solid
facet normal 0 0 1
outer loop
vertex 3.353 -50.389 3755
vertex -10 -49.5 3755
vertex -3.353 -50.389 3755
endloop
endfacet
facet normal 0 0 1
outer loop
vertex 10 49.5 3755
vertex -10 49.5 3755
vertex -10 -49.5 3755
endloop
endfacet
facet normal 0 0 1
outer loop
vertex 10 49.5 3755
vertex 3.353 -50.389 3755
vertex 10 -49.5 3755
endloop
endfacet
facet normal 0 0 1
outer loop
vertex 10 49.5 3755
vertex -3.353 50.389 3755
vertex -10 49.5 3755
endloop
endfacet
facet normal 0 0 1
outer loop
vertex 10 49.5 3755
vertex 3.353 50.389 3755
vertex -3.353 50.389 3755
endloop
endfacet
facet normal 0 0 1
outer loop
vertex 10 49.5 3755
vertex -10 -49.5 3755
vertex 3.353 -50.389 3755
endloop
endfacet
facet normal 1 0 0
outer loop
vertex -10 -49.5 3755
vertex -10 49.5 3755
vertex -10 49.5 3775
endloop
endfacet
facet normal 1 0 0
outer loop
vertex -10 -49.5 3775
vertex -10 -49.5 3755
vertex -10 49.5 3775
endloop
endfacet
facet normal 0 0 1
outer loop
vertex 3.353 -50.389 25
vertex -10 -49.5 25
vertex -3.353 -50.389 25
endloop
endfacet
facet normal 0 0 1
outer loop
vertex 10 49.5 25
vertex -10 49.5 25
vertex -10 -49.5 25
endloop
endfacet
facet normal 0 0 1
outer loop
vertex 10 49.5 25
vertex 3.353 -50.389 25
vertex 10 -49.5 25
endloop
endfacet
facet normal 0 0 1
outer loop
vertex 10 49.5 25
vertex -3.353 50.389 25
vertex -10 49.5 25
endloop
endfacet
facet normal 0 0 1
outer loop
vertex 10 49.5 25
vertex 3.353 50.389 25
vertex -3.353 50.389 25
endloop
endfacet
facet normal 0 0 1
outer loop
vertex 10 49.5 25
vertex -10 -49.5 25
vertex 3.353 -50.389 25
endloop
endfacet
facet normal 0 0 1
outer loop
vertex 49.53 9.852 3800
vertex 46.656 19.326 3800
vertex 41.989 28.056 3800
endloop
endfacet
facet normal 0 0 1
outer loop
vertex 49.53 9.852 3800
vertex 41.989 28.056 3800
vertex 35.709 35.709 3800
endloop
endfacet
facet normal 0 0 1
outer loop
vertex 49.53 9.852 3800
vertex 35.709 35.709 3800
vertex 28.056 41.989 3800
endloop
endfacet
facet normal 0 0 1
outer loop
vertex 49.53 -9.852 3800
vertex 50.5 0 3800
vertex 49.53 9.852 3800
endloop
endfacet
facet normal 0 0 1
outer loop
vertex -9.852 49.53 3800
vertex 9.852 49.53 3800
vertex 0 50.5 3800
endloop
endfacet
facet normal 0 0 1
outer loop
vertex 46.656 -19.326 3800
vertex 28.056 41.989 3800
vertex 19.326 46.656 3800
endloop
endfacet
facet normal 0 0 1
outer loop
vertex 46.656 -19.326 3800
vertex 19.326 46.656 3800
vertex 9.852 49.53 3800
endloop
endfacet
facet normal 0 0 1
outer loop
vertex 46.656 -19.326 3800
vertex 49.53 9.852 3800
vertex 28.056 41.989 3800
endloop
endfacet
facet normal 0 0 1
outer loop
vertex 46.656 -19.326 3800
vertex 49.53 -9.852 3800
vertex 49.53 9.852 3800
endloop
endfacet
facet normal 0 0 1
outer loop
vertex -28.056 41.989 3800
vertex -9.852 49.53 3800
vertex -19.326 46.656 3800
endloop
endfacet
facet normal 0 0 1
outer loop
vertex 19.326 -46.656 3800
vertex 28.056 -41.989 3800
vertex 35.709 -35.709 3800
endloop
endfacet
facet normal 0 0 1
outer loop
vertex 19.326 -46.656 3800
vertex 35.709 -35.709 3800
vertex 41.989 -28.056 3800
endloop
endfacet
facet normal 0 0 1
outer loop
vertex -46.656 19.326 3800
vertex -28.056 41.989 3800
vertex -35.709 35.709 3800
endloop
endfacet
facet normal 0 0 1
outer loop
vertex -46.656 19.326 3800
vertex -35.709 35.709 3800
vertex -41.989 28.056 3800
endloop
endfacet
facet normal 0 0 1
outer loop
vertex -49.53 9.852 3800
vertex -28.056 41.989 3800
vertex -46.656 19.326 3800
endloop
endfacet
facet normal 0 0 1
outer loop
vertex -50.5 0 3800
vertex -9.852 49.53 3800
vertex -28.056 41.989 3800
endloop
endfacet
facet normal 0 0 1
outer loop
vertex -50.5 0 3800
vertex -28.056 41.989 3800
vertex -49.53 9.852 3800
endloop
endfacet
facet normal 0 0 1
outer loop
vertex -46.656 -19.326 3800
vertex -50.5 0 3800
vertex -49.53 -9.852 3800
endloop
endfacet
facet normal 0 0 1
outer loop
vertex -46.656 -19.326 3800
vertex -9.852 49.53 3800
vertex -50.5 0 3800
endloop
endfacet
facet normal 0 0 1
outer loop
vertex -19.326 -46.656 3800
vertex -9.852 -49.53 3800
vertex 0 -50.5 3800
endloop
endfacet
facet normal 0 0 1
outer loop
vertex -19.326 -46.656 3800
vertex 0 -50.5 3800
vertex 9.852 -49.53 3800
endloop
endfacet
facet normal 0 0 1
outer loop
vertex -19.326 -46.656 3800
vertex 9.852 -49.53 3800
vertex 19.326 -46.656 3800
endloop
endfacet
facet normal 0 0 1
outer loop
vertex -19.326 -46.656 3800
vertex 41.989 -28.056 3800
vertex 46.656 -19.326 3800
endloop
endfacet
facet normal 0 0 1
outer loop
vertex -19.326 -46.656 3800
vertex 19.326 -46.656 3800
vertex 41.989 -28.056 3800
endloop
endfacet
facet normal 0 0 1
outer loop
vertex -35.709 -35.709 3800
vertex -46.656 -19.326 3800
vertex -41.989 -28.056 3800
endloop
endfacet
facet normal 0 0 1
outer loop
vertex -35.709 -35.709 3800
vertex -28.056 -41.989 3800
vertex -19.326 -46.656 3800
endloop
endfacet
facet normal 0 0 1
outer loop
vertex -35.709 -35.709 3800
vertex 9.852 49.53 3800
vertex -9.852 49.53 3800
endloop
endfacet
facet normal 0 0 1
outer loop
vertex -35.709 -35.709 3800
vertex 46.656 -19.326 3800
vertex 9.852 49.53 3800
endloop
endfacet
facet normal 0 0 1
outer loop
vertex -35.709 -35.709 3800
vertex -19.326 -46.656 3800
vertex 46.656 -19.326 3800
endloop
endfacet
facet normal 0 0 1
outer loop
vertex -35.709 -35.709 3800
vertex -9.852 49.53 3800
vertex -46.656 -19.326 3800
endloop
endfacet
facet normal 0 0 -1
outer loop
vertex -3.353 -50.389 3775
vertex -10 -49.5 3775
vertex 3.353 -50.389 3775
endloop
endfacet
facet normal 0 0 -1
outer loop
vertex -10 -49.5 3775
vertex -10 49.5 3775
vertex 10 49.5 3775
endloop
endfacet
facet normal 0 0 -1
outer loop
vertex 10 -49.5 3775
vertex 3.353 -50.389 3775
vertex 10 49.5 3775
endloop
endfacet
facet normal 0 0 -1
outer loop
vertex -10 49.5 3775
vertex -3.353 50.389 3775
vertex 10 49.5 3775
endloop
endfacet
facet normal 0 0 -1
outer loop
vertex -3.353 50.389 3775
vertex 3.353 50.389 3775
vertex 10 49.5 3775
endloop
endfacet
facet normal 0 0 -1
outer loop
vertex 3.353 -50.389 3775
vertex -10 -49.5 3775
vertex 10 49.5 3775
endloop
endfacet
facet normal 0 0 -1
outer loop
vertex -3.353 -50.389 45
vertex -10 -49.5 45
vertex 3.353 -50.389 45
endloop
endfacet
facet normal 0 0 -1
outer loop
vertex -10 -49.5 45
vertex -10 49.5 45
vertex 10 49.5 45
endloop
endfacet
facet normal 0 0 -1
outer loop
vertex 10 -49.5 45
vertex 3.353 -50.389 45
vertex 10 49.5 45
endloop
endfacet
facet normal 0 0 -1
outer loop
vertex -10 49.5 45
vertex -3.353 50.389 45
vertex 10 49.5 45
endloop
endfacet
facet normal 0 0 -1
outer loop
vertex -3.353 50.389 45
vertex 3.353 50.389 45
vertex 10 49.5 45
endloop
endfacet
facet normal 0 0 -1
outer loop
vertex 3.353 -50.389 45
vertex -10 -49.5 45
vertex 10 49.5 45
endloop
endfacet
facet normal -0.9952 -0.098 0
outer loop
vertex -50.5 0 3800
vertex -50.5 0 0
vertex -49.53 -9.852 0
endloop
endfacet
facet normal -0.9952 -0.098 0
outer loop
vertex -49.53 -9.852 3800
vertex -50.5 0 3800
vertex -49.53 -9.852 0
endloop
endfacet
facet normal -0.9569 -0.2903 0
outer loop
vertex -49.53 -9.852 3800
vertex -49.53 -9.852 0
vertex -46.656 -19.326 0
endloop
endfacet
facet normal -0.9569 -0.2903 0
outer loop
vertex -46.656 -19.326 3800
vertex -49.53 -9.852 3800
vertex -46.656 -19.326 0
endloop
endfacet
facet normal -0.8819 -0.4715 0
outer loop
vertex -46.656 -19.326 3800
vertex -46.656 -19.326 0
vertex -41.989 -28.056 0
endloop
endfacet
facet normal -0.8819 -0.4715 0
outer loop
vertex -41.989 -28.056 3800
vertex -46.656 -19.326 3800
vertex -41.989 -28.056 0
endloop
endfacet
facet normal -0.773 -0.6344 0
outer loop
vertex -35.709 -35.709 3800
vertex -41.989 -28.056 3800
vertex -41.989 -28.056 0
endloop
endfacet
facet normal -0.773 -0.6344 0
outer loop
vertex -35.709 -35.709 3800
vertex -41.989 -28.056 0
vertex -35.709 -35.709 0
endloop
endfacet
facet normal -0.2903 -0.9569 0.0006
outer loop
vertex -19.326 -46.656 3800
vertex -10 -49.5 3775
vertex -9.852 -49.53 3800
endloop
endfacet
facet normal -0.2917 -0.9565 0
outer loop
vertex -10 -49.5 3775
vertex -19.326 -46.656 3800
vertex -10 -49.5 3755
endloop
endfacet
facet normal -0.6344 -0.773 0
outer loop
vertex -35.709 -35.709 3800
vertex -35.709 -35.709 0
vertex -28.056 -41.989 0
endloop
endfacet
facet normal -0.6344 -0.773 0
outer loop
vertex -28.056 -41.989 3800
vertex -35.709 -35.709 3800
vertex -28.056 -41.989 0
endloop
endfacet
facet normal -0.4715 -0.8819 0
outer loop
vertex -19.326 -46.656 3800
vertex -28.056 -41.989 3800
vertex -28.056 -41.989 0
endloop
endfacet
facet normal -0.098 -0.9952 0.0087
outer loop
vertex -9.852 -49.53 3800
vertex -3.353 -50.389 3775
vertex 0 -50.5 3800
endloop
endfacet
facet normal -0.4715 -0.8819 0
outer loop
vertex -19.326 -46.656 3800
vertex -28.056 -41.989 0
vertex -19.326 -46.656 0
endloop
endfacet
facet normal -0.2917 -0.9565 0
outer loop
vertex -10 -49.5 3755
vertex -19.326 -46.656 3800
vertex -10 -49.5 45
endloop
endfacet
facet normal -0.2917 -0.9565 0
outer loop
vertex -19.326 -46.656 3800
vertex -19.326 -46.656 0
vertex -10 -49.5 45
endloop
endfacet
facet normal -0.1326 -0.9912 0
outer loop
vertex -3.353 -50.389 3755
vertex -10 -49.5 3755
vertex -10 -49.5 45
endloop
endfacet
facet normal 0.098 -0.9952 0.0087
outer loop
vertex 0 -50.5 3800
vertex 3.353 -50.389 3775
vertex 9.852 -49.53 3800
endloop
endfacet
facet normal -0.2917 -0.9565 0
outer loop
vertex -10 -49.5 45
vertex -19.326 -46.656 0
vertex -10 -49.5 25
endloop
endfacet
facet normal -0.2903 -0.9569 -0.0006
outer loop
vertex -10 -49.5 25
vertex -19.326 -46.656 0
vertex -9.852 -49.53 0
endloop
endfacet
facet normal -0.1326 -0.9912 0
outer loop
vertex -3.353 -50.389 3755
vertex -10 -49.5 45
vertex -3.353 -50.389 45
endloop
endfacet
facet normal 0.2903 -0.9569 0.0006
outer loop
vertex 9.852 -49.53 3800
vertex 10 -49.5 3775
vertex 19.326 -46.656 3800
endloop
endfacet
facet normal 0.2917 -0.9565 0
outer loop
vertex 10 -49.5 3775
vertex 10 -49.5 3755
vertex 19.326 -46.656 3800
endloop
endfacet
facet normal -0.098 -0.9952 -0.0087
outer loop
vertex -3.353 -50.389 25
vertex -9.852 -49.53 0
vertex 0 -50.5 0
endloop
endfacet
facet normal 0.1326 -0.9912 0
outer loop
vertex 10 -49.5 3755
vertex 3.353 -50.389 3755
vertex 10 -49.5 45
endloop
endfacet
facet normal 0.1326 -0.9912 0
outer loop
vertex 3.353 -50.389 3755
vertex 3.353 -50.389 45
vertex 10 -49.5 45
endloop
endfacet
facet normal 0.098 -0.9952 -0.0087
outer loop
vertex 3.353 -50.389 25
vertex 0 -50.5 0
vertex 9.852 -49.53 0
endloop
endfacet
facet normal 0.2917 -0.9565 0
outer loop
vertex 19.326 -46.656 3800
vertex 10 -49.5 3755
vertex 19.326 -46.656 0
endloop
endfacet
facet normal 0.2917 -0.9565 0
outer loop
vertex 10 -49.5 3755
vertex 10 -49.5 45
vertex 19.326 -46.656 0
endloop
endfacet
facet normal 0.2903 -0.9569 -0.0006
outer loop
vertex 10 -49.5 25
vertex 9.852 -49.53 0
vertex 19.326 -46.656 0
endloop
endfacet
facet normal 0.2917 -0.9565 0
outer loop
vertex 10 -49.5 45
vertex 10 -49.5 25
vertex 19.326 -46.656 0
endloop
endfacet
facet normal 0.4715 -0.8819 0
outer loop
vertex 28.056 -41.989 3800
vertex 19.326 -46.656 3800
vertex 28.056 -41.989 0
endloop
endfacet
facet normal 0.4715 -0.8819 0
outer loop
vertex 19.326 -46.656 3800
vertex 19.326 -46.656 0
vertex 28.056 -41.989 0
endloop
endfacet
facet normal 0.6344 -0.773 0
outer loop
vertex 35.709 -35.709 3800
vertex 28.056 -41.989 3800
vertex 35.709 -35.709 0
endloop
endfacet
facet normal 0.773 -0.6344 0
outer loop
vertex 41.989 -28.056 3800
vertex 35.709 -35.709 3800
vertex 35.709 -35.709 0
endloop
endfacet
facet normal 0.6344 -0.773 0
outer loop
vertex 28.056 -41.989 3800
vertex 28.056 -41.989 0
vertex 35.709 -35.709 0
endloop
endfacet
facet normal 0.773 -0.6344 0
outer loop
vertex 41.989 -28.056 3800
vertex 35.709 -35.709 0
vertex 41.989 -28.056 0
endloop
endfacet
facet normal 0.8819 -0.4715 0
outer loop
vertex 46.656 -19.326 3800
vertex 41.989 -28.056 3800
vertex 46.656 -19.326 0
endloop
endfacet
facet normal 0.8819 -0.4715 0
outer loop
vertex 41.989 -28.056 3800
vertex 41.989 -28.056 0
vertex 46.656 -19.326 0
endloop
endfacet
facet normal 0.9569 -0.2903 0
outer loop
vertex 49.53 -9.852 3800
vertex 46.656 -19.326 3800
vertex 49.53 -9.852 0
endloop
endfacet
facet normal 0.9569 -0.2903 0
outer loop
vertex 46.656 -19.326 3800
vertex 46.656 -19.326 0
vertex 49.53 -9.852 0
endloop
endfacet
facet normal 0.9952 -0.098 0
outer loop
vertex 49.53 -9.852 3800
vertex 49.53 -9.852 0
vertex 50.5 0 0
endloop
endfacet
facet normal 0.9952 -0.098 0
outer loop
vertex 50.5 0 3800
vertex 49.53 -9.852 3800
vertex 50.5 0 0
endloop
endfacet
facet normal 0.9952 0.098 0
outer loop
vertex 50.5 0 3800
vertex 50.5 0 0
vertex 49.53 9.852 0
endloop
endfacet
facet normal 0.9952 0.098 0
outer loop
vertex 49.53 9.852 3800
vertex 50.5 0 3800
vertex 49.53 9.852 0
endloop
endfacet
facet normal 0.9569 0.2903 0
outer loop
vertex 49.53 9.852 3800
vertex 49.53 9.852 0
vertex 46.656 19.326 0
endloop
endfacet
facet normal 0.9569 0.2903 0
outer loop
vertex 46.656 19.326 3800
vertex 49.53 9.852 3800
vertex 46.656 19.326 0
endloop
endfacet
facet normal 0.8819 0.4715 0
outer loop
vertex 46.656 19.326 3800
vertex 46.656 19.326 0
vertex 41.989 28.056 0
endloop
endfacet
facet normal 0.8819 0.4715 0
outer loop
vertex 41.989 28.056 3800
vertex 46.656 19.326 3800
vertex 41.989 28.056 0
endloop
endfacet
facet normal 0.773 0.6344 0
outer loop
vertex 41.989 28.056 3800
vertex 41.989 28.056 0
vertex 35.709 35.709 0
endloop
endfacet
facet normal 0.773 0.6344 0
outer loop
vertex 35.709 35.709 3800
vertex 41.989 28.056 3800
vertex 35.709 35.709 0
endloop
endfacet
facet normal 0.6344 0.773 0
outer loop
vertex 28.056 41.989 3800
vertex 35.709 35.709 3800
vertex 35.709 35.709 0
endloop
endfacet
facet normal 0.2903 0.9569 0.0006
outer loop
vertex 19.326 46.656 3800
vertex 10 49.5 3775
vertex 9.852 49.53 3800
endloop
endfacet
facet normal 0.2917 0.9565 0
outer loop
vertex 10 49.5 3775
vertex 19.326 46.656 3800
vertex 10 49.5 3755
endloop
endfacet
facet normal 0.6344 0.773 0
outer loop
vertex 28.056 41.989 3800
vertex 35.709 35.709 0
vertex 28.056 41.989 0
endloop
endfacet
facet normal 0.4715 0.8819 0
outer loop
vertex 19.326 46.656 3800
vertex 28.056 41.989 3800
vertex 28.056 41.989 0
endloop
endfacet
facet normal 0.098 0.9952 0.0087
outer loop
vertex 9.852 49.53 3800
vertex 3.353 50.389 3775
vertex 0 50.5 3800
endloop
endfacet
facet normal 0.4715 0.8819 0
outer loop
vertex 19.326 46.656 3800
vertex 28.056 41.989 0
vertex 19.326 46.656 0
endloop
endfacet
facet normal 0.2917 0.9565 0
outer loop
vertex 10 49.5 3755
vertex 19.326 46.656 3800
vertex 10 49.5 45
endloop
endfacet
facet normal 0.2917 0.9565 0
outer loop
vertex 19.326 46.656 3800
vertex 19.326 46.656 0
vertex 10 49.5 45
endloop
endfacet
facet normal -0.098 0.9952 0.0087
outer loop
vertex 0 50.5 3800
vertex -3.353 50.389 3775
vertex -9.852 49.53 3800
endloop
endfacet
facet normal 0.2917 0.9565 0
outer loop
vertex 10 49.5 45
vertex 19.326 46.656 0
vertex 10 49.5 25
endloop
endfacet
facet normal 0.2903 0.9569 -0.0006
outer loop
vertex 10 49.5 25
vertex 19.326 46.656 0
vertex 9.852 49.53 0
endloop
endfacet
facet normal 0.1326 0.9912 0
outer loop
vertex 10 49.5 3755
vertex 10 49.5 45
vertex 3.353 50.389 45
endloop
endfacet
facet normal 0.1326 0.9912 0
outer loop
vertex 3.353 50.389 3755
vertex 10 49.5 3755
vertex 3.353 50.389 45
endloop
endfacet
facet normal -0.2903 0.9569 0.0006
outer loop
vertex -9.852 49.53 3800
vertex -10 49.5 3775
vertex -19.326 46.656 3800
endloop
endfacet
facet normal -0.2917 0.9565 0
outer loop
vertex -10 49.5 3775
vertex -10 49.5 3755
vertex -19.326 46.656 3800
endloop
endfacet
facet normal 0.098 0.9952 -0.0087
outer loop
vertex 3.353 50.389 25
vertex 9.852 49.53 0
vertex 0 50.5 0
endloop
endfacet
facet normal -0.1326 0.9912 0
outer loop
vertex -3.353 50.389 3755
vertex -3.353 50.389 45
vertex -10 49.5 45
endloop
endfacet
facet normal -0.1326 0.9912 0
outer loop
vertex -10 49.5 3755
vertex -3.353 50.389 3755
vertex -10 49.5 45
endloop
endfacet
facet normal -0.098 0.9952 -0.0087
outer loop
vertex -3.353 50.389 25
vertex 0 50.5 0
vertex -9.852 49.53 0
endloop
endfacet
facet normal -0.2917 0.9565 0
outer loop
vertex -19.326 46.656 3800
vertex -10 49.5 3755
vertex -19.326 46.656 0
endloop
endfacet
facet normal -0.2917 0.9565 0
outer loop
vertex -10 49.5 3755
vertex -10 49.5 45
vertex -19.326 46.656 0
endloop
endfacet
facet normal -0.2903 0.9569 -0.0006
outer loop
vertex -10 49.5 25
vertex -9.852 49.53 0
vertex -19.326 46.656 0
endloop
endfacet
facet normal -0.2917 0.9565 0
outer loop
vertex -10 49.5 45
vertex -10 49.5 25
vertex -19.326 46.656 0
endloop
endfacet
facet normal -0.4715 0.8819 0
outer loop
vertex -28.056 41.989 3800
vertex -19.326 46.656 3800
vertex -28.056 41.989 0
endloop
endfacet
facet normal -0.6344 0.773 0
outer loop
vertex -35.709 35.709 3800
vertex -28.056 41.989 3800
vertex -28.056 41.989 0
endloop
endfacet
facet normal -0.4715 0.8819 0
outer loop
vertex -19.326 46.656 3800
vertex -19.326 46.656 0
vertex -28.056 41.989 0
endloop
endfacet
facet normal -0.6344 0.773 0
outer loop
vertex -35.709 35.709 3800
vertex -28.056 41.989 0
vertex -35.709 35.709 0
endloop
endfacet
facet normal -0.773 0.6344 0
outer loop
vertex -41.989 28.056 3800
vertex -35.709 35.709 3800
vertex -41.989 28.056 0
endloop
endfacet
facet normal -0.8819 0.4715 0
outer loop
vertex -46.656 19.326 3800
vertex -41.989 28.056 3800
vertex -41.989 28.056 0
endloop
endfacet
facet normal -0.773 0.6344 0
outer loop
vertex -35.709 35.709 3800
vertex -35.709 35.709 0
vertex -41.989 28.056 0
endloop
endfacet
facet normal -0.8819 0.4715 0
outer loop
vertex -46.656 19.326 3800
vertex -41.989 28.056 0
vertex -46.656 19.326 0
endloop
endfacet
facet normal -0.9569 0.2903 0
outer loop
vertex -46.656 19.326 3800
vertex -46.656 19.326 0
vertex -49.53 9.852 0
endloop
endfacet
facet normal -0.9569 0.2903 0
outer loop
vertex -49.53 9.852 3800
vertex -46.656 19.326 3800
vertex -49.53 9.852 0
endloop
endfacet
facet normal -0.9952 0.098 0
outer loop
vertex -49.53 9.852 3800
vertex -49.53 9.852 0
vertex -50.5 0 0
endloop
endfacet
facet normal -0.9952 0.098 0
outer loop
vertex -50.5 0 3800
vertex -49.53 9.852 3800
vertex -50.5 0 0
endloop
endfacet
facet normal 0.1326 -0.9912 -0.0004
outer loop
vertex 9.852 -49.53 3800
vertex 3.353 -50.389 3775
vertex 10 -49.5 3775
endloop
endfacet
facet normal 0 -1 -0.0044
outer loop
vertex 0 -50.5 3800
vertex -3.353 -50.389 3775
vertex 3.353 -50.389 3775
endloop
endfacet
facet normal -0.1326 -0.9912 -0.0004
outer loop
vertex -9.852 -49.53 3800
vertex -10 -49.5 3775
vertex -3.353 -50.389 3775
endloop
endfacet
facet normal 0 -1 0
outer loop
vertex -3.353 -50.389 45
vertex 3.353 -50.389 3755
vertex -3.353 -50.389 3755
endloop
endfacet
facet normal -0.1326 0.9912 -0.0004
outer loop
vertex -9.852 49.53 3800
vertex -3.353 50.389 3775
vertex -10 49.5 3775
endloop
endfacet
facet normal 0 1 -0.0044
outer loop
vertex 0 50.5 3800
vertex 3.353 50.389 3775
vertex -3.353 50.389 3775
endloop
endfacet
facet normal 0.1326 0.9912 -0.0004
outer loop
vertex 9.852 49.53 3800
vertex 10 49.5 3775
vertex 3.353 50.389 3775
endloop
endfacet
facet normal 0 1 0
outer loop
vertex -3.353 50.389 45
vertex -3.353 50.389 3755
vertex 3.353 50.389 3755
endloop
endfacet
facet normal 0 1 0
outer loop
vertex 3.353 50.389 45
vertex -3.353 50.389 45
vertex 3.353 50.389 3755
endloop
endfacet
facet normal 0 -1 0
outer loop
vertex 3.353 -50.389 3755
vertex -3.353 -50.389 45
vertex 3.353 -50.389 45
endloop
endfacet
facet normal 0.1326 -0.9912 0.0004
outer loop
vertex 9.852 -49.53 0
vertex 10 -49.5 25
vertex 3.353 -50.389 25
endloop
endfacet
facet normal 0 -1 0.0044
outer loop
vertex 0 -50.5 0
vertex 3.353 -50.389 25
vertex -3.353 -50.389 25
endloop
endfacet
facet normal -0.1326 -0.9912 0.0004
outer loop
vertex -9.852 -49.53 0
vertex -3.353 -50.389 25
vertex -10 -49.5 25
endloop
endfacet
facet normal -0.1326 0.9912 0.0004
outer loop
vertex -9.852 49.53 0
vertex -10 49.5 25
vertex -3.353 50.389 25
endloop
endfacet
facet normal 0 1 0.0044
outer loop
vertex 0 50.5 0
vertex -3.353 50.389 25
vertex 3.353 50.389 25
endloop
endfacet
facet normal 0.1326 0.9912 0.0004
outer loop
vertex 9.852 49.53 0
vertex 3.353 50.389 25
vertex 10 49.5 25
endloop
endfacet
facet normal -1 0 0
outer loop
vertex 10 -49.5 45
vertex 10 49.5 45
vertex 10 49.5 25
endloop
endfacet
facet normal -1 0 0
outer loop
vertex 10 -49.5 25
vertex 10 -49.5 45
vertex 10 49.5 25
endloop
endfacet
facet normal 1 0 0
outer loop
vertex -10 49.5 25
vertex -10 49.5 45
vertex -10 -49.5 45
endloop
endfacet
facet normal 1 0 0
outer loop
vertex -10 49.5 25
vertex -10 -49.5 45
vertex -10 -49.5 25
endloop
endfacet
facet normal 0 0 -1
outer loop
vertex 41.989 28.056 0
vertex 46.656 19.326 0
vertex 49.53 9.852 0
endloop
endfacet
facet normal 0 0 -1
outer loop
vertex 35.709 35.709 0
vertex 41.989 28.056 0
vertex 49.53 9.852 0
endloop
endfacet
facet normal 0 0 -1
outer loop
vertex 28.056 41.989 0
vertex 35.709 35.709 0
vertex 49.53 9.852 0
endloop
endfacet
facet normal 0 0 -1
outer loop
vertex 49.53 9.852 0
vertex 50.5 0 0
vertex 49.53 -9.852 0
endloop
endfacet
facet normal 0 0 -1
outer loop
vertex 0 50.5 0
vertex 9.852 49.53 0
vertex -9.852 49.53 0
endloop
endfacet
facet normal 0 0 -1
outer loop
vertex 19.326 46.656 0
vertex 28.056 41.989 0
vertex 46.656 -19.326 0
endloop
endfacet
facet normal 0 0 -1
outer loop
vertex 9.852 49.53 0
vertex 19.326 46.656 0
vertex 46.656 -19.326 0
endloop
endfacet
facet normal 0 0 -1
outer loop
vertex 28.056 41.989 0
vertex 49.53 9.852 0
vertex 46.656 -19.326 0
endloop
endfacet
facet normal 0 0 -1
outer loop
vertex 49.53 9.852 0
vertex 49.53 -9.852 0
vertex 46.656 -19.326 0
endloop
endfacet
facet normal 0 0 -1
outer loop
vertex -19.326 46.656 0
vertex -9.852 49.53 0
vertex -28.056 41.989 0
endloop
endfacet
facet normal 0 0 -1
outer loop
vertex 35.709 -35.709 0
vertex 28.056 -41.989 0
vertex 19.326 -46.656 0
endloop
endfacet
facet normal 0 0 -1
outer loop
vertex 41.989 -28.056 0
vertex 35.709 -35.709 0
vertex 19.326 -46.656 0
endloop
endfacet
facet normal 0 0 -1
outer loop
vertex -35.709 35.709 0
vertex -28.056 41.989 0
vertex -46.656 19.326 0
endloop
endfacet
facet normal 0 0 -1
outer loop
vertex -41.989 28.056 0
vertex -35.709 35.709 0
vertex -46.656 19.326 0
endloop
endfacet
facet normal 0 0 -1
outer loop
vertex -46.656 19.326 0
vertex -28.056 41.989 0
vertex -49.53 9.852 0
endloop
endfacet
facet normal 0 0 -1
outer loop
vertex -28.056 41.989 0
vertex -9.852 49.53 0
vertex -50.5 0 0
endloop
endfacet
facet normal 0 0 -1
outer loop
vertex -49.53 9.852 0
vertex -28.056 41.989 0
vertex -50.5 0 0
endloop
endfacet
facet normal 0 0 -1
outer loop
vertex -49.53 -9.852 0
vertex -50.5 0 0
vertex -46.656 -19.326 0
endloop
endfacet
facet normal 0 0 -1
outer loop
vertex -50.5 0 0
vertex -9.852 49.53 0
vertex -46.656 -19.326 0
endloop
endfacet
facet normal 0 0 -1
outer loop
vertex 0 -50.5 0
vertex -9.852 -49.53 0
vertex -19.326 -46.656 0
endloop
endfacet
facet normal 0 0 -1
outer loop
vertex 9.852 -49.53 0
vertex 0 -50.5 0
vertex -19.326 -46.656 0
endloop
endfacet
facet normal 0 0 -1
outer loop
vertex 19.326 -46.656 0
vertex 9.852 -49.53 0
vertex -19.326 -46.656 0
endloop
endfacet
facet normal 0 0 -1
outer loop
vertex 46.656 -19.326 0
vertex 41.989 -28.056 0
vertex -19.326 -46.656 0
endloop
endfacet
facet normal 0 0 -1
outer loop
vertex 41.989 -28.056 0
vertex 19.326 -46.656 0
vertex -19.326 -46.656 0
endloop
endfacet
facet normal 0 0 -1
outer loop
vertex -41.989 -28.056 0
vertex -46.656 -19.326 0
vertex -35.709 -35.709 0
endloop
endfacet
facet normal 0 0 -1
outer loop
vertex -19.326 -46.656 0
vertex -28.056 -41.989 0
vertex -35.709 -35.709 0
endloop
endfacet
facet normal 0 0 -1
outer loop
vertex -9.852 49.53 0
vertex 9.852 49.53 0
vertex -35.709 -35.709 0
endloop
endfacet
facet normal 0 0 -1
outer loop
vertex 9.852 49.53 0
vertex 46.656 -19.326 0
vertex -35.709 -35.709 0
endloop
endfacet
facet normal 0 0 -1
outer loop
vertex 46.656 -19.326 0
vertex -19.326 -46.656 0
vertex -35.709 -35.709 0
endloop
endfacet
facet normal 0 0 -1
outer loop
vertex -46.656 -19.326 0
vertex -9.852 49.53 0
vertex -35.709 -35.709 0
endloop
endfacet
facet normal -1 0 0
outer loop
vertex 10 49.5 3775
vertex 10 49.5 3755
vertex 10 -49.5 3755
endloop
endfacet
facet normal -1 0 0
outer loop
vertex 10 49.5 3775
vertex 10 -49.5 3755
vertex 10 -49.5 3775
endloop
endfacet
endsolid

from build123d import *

# Parameters (mm, degrees)
SKETCH1_R           = 50.5
BOSS_EXTRUDE1_DEPTH = 3800
SKETCH2_W           = 20
SKETCH2_H           = 20
CUT_EXTRUDE1_DEPTH  = 3801.671059168


with BuildPart() as part:
    # Sketch1 → Boss-Extrude1 (new body)
    with BuildSketch(Plane.XY):
        with Locations(Location((0, 0, 0), (0, 0, 180))):
            Circle(SKETCH1_R)
    extrude(amount=BOSS_EXTRUDE1_DEPTH)

    # Sketch2 → Cut-Extrude1 (cut, symmetric)
    with BuildSketch(Plane(origin=(0, 0, 0), x_dir=(1, 0, 0), z_dir=(0, 1, 0))):
        with Locations((0, -35)):
            Rectangle(SKETCH2_W, SKETCH2_H)
    cut_extrude1 = extrude(amount=CUT_EXTRUDE1_DEPTH, both=True, mode=Mode.SUBTRACT)

    # Mirror1: Cut-Extrude1 across plane
    add(cut_extrude1.mirror(Plane(origin=(0, 0, 1900), x_dir=(1, 0, 0), z_dir=(0, 0, -1))), mode=Mode.SUBTRACT)


solid = part.part
